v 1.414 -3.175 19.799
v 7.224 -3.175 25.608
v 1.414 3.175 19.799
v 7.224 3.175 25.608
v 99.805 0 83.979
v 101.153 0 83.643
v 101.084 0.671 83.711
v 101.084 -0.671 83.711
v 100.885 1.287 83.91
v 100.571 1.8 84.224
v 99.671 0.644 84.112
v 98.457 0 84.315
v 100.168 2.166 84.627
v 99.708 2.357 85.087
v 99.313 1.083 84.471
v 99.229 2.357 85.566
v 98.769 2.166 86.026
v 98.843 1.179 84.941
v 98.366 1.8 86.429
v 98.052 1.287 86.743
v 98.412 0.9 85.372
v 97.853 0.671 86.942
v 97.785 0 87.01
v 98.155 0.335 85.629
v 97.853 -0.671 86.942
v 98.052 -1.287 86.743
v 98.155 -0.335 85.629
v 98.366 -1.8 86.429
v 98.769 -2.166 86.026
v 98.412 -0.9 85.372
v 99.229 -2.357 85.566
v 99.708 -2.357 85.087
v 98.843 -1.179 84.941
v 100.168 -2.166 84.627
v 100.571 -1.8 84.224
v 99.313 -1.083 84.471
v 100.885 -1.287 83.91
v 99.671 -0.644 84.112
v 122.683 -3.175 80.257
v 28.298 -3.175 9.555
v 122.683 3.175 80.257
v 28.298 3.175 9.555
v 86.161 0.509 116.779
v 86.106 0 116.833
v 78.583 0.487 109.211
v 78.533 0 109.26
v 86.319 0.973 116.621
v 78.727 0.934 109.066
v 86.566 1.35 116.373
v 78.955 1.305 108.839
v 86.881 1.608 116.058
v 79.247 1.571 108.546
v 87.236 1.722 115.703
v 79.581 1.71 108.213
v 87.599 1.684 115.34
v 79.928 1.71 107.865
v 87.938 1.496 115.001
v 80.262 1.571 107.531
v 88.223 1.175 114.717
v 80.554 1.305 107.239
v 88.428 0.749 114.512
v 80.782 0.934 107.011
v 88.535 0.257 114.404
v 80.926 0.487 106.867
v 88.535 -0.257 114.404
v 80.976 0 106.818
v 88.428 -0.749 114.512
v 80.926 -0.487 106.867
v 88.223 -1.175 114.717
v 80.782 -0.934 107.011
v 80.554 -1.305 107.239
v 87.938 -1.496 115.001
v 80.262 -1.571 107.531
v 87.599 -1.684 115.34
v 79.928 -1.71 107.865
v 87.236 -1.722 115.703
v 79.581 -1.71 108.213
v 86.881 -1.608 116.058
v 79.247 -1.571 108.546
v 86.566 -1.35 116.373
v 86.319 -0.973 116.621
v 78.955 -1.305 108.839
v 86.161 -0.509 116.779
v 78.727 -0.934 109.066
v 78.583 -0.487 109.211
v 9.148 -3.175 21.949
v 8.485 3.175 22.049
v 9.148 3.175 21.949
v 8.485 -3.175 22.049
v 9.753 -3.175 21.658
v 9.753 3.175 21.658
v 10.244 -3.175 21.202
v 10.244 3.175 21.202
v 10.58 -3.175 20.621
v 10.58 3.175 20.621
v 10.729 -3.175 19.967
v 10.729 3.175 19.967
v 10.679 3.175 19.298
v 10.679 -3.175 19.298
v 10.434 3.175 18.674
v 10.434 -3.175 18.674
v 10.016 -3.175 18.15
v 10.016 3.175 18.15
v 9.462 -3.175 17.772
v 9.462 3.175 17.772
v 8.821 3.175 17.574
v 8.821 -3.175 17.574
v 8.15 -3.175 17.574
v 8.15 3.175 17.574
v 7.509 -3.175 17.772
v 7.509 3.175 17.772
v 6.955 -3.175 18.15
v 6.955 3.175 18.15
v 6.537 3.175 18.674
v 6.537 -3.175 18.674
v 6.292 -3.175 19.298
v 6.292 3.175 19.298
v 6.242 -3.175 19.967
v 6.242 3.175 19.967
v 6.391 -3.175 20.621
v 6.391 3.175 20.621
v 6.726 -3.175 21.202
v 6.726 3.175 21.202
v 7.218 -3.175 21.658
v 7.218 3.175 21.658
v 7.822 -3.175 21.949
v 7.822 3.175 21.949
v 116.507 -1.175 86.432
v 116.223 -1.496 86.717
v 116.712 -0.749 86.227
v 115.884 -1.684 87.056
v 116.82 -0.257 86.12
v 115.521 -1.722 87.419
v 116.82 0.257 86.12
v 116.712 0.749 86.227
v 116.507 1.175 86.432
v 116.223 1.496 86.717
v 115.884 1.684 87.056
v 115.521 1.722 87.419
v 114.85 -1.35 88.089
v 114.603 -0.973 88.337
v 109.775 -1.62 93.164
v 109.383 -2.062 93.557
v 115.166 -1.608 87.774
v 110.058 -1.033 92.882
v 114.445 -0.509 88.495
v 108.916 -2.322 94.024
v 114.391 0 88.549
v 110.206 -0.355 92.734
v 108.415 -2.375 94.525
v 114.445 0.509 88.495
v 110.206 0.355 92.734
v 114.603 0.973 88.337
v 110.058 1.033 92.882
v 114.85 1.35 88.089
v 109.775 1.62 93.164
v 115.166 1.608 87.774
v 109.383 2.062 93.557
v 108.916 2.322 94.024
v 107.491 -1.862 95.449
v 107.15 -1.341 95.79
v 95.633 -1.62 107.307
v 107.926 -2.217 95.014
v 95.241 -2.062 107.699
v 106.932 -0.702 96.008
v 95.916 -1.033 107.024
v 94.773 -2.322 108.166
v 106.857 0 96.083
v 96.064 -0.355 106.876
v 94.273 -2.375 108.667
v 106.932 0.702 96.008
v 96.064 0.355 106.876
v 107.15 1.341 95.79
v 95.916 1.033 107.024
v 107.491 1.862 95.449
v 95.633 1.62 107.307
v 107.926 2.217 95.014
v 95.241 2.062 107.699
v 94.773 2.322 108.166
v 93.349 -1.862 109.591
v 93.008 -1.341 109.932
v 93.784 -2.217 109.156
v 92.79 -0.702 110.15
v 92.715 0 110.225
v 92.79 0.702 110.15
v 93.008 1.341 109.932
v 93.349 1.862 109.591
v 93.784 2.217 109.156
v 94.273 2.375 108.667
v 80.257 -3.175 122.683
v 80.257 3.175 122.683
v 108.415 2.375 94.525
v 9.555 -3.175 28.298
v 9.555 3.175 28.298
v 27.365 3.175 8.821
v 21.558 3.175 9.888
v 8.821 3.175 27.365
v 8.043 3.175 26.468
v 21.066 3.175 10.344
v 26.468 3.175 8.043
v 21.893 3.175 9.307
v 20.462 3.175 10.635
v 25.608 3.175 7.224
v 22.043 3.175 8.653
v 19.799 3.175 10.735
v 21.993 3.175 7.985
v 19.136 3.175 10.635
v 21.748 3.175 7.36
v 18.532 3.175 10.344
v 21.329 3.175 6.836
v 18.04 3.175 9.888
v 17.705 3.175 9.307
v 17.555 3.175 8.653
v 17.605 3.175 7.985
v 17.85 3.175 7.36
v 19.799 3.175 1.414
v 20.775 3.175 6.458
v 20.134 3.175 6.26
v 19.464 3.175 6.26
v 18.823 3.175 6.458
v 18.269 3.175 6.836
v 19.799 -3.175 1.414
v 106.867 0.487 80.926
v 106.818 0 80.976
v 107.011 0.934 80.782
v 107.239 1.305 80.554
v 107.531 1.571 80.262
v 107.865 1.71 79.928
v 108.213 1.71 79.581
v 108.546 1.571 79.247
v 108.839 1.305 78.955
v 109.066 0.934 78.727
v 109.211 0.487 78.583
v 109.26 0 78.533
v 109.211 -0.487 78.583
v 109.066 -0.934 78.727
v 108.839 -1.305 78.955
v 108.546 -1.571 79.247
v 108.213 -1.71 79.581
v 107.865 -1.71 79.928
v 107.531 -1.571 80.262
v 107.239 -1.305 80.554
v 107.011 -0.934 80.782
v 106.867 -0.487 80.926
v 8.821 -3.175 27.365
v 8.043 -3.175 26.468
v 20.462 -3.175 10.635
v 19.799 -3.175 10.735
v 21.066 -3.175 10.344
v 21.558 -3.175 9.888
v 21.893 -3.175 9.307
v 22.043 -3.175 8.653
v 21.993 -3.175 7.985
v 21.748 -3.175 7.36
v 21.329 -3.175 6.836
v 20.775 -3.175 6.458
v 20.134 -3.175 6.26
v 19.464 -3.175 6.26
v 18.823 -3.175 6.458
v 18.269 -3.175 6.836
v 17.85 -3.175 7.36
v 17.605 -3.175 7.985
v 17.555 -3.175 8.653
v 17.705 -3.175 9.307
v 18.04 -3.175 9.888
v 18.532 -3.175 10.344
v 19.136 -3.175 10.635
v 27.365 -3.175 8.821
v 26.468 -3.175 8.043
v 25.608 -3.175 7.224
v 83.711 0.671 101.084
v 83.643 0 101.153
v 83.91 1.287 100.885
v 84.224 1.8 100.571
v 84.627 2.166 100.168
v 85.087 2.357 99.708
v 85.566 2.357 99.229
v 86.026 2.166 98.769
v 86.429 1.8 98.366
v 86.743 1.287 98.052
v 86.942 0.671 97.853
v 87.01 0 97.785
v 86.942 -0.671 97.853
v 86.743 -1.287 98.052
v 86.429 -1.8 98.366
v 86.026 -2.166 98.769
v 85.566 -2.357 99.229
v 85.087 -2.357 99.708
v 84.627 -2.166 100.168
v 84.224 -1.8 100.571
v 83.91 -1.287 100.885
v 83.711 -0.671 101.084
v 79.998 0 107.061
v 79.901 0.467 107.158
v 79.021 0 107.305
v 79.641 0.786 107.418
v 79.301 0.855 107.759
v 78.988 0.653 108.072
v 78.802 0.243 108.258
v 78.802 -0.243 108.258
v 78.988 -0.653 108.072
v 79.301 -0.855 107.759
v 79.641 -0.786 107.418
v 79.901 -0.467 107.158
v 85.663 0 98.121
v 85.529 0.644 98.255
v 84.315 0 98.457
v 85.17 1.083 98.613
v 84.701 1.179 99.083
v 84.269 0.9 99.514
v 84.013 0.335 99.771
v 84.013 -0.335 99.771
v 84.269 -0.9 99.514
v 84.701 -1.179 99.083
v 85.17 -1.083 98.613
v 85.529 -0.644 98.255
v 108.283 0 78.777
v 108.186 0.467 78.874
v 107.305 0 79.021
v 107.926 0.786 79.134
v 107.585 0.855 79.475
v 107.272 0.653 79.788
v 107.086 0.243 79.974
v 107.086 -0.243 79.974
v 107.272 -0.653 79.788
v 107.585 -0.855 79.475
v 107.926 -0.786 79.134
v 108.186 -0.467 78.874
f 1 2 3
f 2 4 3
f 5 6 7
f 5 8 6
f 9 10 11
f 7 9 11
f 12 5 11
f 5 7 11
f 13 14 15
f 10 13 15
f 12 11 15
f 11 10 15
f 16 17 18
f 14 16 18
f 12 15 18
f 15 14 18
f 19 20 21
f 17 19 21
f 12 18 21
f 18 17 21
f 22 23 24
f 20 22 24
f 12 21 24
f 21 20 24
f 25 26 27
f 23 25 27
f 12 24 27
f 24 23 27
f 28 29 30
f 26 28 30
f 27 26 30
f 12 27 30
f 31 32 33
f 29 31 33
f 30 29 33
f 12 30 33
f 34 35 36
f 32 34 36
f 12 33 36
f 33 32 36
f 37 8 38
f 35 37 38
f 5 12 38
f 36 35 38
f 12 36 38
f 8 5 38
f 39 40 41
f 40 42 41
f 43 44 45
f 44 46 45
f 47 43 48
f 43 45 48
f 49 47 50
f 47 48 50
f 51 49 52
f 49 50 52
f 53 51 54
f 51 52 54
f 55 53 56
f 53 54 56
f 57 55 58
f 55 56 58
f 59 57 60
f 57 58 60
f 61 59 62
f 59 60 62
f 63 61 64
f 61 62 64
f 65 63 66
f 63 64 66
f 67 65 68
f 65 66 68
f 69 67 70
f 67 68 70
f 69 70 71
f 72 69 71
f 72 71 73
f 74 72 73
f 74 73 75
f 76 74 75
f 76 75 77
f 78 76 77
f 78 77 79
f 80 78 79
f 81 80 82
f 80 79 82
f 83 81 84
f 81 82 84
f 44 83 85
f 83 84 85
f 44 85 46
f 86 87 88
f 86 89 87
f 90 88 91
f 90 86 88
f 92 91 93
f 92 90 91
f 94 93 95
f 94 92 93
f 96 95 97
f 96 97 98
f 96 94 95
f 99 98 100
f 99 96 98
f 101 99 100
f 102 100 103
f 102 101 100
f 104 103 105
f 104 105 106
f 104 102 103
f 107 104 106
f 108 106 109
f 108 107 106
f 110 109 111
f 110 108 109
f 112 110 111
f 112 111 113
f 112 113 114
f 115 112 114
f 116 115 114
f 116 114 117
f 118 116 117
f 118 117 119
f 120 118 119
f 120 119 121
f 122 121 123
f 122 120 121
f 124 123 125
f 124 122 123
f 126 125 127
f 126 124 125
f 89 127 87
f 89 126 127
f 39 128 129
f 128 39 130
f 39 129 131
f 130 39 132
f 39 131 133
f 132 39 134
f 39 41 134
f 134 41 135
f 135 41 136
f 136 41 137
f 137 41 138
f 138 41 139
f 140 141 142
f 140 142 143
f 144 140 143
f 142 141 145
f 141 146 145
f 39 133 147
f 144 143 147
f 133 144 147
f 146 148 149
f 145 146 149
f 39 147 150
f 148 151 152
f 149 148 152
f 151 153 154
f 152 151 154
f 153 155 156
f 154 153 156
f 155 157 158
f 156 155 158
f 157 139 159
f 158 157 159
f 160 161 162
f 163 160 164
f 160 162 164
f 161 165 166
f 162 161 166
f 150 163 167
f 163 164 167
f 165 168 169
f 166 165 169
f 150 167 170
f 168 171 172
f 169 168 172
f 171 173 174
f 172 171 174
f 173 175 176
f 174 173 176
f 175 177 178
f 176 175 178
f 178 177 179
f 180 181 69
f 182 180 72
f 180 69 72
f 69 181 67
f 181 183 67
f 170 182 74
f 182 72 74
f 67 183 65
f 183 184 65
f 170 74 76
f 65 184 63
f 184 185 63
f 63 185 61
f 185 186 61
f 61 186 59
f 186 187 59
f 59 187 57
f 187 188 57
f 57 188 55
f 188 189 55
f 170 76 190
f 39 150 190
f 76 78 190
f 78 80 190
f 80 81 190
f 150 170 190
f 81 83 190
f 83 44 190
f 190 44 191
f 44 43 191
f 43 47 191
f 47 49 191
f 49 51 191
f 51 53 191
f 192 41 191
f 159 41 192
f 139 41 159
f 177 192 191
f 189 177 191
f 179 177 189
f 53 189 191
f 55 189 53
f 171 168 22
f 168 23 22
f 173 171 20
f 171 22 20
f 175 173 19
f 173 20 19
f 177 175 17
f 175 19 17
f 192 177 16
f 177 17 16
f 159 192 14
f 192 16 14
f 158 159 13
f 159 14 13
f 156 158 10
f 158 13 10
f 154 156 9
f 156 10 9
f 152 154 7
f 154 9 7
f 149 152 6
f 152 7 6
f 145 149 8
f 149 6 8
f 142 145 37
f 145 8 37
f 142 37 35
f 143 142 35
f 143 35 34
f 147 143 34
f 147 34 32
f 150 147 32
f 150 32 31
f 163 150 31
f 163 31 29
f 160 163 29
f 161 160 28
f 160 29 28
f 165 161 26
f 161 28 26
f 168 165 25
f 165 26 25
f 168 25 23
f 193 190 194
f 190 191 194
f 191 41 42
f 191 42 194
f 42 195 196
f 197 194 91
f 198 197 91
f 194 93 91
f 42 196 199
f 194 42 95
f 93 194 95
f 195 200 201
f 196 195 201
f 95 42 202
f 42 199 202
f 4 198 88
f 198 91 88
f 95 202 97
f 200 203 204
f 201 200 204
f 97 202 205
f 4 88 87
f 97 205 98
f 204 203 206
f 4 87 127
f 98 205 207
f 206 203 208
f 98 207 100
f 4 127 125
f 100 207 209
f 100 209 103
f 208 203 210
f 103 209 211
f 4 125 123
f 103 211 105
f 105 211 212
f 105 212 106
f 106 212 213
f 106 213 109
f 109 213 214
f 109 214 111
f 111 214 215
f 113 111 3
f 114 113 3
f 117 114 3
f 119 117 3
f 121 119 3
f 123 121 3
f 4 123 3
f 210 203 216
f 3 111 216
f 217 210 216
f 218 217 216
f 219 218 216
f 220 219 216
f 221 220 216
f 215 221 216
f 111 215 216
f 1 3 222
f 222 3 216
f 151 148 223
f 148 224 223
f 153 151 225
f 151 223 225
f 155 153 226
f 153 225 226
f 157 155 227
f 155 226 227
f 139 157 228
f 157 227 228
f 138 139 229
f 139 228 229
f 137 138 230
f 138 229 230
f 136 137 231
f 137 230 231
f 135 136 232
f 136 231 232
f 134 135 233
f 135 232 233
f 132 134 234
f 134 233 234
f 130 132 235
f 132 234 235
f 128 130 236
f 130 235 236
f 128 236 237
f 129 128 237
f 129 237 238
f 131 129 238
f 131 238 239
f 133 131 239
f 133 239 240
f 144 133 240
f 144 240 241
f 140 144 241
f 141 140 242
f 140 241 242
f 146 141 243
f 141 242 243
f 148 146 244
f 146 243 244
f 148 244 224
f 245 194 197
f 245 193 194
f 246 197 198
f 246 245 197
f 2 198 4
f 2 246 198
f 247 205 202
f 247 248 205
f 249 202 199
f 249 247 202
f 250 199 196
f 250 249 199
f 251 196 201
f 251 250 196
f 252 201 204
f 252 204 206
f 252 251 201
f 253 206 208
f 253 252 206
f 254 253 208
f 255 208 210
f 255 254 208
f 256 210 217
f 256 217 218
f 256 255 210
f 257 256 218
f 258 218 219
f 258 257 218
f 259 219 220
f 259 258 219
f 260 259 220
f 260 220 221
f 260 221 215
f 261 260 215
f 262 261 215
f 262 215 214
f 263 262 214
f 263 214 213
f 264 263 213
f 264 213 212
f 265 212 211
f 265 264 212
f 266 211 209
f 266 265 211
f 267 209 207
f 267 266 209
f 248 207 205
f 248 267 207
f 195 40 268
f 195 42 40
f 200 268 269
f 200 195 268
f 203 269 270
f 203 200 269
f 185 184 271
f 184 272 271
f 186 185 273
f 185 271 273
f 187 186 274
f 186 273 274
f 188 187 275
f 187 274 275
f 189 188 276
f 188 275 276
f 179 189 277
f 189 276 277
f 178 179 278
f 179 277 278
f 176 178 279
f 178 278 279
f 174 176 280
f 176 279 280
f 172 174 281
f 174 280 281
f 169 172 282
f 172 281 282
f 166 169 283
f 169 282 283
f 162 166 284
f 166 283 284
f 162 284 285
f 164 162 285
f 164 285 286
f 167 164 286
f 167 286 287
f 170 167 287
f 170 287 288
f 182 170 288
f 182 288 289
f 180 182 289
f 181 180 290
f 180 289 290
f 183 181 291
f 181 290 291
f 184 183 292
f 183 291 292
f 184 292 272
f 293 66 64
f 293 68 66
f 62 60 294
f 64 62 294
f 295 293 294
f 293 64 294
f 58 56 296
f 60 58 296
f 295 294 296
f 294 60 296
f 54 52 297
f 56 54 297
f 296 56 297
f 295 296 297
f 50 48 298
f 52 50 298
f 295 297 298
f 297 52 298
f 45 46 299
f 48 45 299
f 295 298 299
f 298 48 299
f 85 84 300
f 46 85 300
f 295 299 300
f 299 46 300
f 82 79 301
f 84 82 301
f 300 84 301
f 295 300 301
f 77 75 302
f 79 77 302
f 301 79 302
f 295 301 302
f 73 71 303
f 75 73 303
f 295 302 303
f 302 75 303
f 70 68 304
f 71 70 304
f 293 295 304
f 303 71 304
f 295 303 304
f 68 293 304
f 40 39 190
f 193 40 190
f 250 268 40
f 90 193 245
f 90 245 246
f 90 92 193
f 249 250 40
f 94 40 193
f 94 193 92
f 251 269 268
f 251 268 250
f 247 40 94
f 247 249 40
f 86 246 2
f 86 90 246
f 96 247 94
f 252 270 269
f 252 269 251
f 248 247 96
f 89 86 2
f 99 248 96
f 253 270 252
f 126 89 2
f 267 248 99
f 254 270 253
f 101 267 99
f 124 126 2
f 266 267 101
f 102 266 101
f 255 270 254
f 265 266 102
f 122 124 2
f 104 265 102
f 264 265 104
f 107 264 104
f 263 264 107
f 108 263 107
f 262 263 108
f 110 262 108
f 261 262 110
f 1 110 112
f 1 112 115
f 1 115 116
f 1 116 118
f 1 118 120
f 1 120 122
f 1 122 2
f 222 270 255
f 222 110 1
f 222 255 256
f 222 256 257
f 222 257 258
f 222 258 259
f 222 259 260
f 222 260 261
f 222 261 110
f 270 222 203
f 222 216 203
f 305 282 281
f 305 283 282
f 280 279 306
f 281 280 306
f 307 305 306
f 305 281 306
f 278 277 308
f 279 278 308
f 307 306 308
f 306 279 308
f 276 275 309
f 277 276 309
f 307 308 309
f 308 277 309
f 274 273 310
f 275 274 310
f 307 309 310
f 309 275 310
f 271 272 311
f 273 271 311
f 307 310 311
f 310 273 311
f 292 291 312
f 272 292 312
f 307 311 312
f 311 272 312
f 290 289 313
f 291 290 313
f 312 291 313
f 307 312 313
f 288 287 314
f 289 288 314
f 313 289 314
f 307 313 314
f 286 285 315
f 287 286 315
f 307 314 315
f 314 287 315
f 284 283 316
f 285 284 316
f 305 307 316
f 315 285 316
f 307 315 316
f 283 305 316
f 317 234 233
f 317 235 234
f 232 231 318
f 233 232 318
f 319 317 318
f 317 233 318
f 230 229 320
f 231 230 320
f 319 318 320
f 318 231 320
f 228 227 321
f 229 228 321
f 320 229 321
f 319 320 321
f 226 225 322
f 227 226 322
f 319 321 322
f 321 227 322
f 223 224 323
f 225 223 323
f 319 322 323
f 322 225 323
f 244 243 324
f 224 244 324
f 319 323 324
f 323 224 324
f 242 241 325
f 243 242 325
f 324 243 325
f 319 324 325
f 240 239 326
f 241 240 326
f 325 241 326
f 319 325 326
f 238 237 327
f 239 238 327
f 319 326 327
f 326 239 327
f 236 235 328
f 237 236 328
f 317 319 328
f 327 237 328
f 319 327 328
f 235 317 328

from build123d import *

# Parameters (mm, degrees)
SKETCH1_R                       = 2.25
BOSS_EXTRUDE1_DEPTH             = 3.175
F_8_32_TAPPED_HOLE1_D           = 3.4544
F_8_32_TAPPED_HOLE1_DEPTH       = 10.71
F_8_32_TAPPED_HOLE1_TIP         = 1.037806461
F_3_16_0_1875_DOWEL_HOLE1_D     = 4.7625
F_3_16_0_1875_DOWEL_HOLE1_DEPTH = 12.83
F_3_16_0_1875_DOWEL_HOLE1_TIP   = 1.430799349
FILLET1_R                       = 25


with BuildPart() as part:
    # Sketch1 → Boss-Extrude1 (new, symmetric)
    with BuildSketch(Plane(origin=(0, 0, 0), x_dir=(1, 0, 0), z_dir=(0, 1, 0))):
        Polygon((80.256619665, -122.683026536), (8.485281374, -26.870057685), (1.414213562, -19.798989873), (19.798989873, -1.414213562), (26.870057685, -8.485281374), (122.683026536, -80.256619665), align=None)
        with Locations(Location((8.485281374, -19.798989873, 0), (0, 0, 270))):
            Circle(SKETCH1_R, mode=Mode.SUBTRACT)
        with Locations(Location((19.798989873, -8.485281374, 0), (0, 0, 270))):
            Circle(SKETCH1_R, mode=Mode.SUBTRACT)
    extrude(amount=BOSS_EXTRUDE1_DEPTH, both=True)

    # #8-32 Tapped Hole1
    with Locations(Plane(origin=(101.4698231, 0, 101.4698231), x_dir=(0.7071067811865462, 0, -0.7071067811865489), z_dir=(0.7071067811865489, 0, 0.7071067811865462))):
        with Locations((20, 0), (-20, 0)):
            Hole(F_8_32_TAPPED_HOLE1_D / 2, depth=F_8_32_TAPPED_HOLE1_DEPTH)
            with Locations((0, 0, -(F_8_32_TAPPED_HOLE1_DEPTH + F_8_32_TAPPED_HOLE1_TIP / 2))):  # 118° drill point
                Cone(0, F_8_32_TAPPED_HOLE1_D / 2, F_8_32_TAPPED_HOLE1_TIP, mode=Mode.SUBTRACT)

    # 3/16 (0.1875) Dowel Hole1
    with Locations(Plane(origin=(101.4698231, 0, 101.4698231), x_dir=(0.7071067811865462, 0, -0.7071067811865489), z_dir=(0.7071067811865489, 0, 0.7071067811865462))):
        with Locations((-10, 0), (10, 0)):
            Hole(F_3_16_0_1875_DOWEL_HOLE1_D / 2, depth=F_3_16_0_1875_DOWEL_HOLE1_DEPTH)
            with Locations((0, 0, -(F_3_16_0_1875_DOWEL_HOLE1_DEPTH + F_3_16_0_1875_DOWEL_HOLE1_TIP / 2))):  # 118° drill point
                Cone(0, F_3_16_0_1875_DOWEL_HOLE1_D / 2, F_3_16_0_1875_DOWEL_HOLE1_TIP, mode=Mode.SUBTRACT)

    # Fillet1
    fillet1_edges = [part.edges().sort_by_distance(p)[0] for p in [
        (8.485281374, 0, 26.870057685),
        (26.870057685, 0, 8.485281374),
    ]]
    fillet(fillet1_edges, radius=FILLET1_R)


solid = part.part
